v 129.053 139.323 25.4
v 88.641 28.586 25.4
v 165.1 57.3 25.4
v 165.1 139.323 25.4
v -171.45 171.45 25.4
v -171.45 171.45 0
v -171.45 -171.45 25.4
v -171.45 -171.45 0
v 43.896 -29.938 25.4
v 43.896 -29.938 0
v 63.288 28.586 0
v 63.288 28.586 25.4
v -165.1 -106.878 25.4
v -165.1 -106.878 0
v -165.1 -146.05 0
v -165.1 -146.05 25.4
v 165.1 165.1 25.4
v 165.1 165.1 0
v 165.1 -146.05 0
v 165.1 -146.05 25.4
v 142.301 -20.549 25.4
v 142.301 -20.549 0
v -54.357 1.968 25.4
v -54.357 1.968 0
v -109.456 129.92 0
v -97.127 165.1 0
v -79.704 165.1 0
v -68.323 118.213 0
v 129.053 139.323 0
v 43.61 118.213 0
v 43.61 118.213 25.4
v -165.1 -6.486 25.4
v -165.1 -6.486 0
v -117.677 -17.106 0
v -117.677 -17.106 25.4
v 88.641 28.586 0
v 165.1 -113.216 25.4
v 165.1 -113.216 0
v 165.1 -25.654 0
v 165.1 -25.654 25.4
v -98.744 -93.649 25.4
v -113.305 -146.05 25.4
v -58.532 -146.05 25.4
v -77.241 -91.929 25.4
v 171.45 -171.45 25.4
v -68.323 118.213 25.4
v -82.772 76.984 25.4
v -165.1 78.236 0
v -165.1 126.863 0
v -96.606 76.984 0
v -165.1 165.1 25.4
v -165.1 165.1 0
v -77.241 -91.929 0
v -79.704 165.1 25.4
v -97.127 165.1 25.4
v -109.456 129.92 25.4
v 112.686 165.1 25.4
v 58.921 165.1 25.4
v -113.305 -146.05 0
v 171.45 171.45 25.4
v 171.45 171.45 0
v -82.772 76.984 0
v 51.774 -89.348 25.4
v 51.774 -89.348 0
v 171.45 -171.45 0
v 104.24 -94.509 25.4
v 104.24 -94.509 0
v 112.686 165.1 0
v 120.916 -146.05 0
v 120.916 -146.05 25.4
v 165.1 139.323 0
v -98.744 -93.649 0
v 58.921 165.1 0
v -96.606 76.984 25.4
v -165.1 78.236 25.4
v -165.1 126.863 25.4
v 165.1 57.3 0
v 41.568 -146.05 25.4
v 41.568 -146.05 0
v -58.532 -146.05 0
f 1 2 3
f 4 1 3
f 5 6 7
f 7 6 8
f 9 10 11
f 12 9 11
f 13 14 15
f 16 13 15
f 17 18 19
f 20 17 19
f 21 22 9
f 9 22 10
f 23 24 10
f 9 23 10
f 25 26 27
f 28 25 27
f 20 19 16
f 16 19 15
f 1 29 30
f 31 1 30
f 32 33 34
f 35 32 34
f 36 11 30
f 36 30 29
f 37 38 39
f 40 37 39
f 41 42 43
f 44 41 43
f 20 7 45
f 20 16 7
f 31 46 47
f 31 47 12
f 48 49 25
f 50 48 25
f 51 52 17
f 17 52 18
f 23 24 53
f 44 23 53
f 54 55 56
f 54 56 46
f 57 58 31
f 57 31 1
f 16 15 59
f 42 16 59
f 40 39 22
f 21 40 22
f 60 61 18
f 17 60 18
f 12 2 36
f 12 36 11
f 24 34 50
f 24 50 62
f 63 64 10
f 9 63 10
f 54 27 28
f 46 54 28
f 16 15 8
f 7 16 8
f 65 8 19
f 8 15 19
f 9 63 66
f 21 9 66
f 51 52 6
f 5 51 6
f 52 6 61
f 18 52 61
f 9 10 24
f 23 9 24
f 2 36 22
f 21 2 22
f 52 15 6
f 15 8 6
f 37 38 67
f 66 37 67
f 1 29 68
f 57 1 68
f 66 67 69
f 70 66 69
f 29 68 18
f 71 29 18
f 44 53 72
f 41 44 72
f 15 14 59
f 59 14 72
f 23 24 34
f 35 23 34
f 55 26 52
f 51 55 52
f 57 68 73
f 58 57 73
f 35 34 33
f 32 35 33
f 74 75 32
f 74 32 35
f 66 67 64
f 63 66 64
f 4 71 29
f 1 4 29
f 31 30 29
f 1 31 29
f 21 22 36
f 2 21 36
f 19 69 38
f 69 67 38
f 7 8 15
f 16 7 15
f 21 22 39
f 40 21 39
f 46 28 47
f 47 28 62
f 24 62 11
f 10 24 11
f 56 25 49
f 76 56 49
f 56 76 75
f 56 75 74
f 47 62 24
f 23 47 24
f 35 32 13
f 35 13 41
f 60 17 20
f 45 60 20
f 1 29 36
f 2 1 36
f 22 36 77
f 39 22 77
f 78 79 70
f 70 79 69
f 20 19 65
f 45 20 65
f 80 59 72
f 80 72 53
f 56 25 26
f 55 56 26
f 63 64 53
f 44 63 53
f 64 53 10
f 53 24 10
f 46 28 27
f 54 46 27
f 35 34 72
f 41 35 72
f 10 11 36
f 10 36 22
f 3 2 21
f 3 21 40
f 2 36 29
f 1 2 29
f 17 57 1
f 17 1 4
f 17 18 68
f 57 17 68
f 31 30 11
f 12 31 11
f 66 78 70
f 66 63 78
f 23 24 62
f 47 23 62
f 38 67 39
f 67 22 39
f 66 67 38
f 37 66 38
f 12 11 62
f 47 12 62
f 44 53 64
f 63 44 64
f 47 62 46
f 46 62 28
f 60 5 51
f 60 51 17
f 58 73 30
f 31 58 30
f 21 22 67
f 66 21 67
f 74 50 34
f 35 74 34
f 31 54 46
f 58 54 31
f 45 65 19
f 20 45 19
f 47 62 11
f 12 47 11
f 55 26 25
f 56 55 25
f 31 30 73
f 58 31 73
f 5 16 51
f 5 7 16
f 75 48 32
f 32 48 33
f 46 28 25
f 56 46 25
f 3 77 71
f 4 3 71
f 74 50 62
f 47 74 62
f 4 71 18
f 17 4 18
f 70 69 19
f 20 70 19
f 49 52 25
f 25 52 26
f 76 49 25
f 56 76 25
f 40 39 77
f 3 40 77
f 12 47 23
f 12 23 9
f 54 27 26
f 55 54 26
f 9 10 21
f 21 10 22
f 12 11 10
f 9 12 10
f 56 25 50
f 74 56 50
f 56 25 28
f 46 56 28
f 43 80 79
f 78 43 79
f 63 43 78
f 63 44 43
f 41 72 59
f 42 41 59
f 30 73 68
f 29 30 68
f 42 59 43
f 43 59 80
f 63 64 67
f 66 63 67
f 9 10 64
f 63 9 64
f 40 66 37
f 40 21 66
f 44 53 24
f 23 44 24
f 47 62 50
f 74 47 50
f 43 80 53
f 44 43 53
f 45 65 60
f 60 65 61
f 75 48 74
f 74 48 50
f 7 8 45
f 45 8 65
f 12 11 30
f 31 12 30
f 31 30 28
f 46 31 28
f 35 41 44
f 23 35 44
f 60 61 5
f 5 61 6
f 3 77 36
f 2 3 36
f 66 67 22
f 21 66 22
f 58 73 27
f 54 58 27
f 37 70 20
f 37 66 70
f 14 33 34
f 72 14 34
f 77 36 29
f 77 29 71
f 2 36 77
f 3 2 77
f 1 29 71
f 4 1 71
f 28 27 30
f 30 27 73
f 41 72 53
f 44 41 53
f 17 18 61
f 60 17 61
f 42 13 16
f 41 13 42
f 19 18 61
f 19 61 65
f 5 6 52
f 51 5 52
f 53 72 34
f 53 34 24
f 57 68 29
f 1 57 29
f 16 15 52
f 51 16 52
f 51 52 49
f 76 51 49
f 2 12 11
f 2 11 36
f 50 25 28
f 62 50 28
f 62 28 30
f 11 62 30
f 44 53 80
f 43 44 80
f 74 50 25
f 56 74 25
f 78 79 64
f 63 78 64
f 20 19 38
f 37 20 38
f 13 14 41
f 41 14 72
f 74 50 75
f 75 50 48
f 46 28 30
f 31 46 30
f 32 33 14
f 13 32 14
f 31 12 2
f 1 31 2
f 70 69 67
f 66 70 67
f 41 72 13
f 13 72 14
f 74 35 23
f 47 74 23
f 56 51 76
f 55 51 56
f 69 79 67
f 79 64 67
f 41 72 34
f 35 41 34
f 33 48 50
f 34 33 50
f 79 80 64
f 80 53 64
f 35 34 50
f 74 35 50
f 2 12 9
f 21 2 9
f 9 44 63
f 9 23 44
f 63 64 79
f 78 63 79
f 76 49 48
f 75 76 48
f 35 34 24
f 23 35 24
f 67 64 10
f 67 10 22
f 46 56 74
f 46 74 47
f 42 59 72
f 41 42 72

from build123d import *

# Parameters (mm, degrees)
F1_DEPTH = 25.4
F2_DEPTH = 25.4
F3_DEPTH = 25.4
F4_DEPTH = 25.4
F5_DEPTH = 25.4


with BuildPart() as f1:
    # F0 (on Top) → F1 (new body)
    with BuildSketch(Plane.XY):
        Polygon((165.1, 165.1), (171.45, 171.45), (-171.45, 171.45), (-165.1, 165.1), (-97.126547, 165.1), (-79.704373, 165.1), (58.920644, 165.1), (112.686343, 165.1), align=None)
        Polygon((-171.45, -171.45), (171.45, -171.45), (165.1, -146.05), (120.915994, -146.05), (41.568272, -146.05), (-58.532443, -146.05), (-113.305233, -146.05), (-165.1, -146.05), align=None)
    extrude(amount=F1_DEPTH)


with BuildPart() as f2:
    # F0 (on Top) → F2 (new body)
    with BuildSketch(Plane.XY):
        Polygon((-165.1, 165.1), (-171.45, 171.45), (-171.45, -171.45), (-165.1, -146.05), (-165.1, -106.878193), (-165.1, -6.485502), (-165.1, 78.235695), (-165.1, 126.86309), align=None)
        Polygon((171.45, -171.45), (171.45, 171.45), (165.1, 165.1), (165.1, 139.322575), (165.1, 57.30013), (165.1, -25.654365), (165.1, -113.215851), (165.1, -146.05), align=None)
    extrude(amount=F2_DEPTH)


with BuildPart() as f3:
    # F0 (on Top) → F3 (new body)
    with BuildSketch(Plane.XY):
        Polygon((-79.704373, 165.1), (-97.126547, 165.1), (-109.455608, 129.919944), (-68.323039, 118.213111), align=None)
        Polygon((-82.772188, 76.983541), (-96.605813, 76.983541), (-117.677249, -17.105883), (-54.356676, 1.968068), align=None)
        Polygon((-98.74364, -93.648814), (-113.305233, -146.05), (-58.532443, -146.05), (-77.241085, -91.928616), align=None)
        Polygon((129.053091, 139.322575), (112.686343, 165.1), (58.920644, 165.1), (43.610042, 118.213111), align=None)
        Polygon((142.301416, -20.548595), (88.641326, 28.585863), (63.287737, 28.585863), (43.895516, -29.938149), align=None)
        Polygon((41.568272, -146.05), (120.915994, -146.05), (104.240492, -94.508916), (51.774256, -89.348301), align=None)
    extrude(amount=F3_DEPTH)


with BuildPart() as f4:
    # F0 (on Top) → F4 (new body)
    with BuildSketch(Plane.XY):
        Polygon((-68.323039, 118.213111), (-109.455608, 129.919944), (-96.605813, 76.983541), (-82.772188, 76.983541), align=None)
        Polygon((-117.677249, -17.105883), (-98.74364, -93.648814), (-77.241085, -91.928616), (-54.356676, 1.968068), align=None)
        Polygon((51.774256, -89.348301), (104.240492, -94.508916), (142.301416, -20.548595), (43.895516, -29.938149), align=None)
        Polygon((88.641326, 28.585863), (129.053091, 139.322575), (43.610042, 118.213111), (63.287737, 28.585863), align=None)
        Polygon((43.610042, 118.213111), (58.920644, 165.1), (-79.704373, 165.1), (-68.323039, 118.213111), align=None)
        Polygon((-97.126547, 165.1), (-165.1, 165.1), (-165.1, 126.86309), (-109.455608, 129.919944), align=None)
        Polygon((43.895516, -29.938149), (63.287737, 28.585863), (-82.772188, 76.983541), (-54.356676, 1.968068), align=None)
        Polygon((165.1, -25.654365), (165.1, 57.30013), (88.641326, 28.585863), (142.301416, -20.548595), align=None)
        Polygon((165.1, 139.322575), (165.1, 165.1), (112.686343, 165.1), (129.053091, 139.322575), align=None)
        Polygon((120.915994, -146.05), (165.1, -146.05), (165.1, -113.215851), (104.240492, -94.508916), align=None)
        Polygon((-58.532443, -146.05), (41.568272, -146.05), (51.774256, -89.348301), (-77.241085, -91.928616), align=None)
        Polygon((-96.605813, 76.983541), (-165.1, 78.235695), (-165.1, -6.485502), (-117.677249, -17.105883), align=None)
        Polygon((-165.1, -106.878193), (-165.1, -146.05), (-113.305233, -146.05), (-98.74364, -93.648814), align=None)
    extrude(amount=F4_DEPTH)


with BuildPart() as f5:
    # F0 (on Top) → F5 (new body)
    with BuildSketch(Plane.XY):
        Polygon((-109.455608, 129.919944), (-165.1, 126.86309), (-165.1, 78.235695), (-96.605813, 76.983541), align=None)
        Polygon((63.287737, 28.585863), (43.610042, 118.213111), (-68.323039, 118.213111), (-82.772188, 76.983541), align=None)
        Polygon((165.1, 57.30013), (165.1, 139.322575), (129.053091, 139.322575), (88.641326, 28.585863), align=None)
        Polygon((104.240492, -94.508916), (165.1, -113.215851), (165.1, -25.654365), (142.301416, -20.548595), align=None)
        Polygon((-77.241085, -91.928616), (51.774256, -89.348301), (43.895516, -29.938149), (-54.356676, 1.968068), align=None)
        Polygon((-165.1, -6.485502), (-165.1, -106.878193), (-98.74364, -93.648814), (-117.677249, -17.105883), align=None)
    extrude(amount=F5_DEPTH)


solid = Compound([f1.part, f2.part, f3.part, f4.part, f5.part])
